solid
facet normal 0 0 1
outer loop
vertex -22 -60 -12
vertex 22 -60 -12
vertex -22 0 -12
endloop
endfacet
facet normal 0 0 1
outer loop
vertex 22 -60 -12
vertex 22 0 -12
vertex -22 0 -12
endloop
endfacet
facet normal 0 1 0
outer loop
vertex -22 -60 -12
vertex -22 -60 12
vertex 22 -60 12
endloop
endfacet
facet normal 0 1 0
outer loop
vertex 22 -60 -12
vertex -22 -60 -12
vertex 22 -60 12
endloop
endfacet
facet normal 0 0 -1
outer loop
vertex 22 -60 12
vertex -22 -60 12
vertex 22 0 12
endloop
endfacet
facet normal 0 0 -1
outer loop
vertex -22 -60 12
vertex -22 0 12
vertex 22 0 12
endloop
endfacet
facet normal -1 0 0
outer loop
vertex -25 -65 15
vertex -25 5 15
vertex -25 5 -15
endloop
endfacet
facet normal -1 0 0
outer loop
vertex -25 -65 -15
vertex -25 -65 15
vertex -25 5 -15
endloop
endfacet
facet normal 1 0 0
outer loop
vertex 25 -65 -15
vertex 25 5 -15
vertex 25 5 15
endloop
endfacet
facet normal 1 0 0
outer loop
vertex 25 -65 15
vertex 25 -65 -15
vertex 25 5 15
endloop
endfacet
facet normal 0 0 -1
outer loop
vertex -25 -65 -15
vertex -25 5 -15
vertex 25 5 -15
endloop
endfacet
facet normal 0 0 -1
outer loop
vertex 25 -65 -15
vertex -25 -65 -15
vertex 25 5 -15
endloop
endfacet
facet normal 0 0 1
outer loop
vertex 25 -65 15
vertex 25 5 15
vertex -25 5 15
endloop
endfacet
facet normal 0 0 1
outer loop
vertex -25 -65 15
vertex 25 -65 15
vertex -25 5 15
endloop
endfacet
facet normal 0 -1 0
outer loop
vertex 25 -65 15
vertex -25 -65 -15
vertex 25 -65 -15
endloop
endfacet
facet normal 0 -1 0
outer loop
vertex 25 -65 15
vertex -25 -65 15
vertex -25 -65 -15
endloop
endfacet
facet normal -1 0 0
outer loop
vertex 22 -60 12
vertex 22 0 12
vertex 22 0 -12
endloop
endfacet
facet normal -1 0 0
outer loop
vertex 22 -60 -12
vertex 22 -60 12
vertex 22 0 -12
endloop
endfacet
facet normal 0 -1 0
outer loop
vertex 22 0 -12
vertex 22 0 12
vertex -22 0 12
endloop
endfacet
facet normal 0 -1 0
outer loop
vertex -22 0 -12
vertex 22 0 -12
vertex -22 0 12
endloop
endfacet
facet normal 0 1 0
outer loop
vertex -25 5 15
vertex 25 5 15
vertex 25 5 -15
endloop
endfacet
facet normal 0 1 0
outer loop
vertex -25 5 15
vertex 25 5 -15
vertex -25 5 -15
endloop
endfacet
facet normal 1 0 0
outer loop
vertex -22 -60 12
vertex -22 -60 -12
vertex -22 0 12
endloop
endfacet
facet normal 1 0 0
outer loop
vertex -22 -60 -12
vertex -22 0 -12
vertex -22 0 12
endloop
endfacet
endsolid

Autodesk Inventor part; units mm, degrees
ref_plane "YZ Plane" through (0, 0, 0) normal (1, 0, 0) x (0, 1, 0)
ref_plane "XZ Plane" through (0, 0, 0) normal (0, 1, 0) x (-1, 0, 0)
ref_plane "XY Plane" through (0, 0, 0) normal (0, 0, 1) x (1, 0, 0)
sketch "Esquisse1" plane through (0, 0, 0) normal (0, 1, 0) x (-1, 0, 0)
  line L0 (-25, 15) -> (25, 15)
  line L1 (25, 15) -> (25, -15)
  line L2 (25, -15) -> (-25, -15)
  line L3 (-25, -15) -> (-25, 15)
  line L4 (-25, 15) -> (25, -15) construction
  line L5 (25, 15) -> (-25, -15) construction
  line L6 (-22, 12) -> (22, 12)
  line L7 (22, 12) -> (22, -12)
  line L8 (22, -12) -> (-22, -12)
  line L9 (-22, -12) -> (-22, 12)
  line L10 (-22, 12) -> (22, -12) construction
  line L11 (22, 12) -> (-22, -12) construction
  point P0 (0, 0)
  dimension "d0" = 50
  dimension "d1" = 30
  dimension "d2" = 3
  dimension "d3" = 3
extrude "Extrusion1" add sketch "Esquisse1" along normal blind 5 contours L0 L1 L2 L3 | L6 L7 L8 L9
sketch "Esquisse2" plane through (0, 0, 0) normal (0, -1, 0) x (1, 0, 0)
  line L0 (-22, 12) -> (22, 12)
  line L1 (22, 12) -> (22, -12)
  line L2 (22, -12) -> (-22, -12)
  line L3 (-22, -12) -> (-22, 12)
  line L4 (-22, 12) -> (22, -12) construction
  line L5 (22, 12) -> (-22, -12) construction
  line L6 (-25, -15) -> (25, -15) projected
  line L7 (25, -15) -> (25, 15) projected
  line L8 (25, 15) -> (-25, 15) projected
  line L9 (-25, 15) -> (-25, -15) projected
  point P0 (0, 0)
  dimension "d6" = 3
  dimension "d7" = 3
extrude "Extrusion2" add sketch "Esquisse2" along normal blind 60
sketch "Esquisse3" plane through (0, -60, 0) normal (0, -1, 0) x (1, 0, 0)
  line L0 (25, -15) -> (25, 15) projected
  line L1 (-25, -15) -> (25, -15) projected
  line L2 (25, 15) -> (-25, 15) projected
  line L3 (-25, 15) -> (-25, -15) projected
  point P0 (0, 0)
extrude "Extrusion3" add sketch "Esquisse3" along normal blind 5
sketch "Esquisse4" plane through (0, 5, 0) normal (0, 1, 0) x (1, 0, 0)
  point P0 (0, 0)
properties part number "Pièce_roue folle"
